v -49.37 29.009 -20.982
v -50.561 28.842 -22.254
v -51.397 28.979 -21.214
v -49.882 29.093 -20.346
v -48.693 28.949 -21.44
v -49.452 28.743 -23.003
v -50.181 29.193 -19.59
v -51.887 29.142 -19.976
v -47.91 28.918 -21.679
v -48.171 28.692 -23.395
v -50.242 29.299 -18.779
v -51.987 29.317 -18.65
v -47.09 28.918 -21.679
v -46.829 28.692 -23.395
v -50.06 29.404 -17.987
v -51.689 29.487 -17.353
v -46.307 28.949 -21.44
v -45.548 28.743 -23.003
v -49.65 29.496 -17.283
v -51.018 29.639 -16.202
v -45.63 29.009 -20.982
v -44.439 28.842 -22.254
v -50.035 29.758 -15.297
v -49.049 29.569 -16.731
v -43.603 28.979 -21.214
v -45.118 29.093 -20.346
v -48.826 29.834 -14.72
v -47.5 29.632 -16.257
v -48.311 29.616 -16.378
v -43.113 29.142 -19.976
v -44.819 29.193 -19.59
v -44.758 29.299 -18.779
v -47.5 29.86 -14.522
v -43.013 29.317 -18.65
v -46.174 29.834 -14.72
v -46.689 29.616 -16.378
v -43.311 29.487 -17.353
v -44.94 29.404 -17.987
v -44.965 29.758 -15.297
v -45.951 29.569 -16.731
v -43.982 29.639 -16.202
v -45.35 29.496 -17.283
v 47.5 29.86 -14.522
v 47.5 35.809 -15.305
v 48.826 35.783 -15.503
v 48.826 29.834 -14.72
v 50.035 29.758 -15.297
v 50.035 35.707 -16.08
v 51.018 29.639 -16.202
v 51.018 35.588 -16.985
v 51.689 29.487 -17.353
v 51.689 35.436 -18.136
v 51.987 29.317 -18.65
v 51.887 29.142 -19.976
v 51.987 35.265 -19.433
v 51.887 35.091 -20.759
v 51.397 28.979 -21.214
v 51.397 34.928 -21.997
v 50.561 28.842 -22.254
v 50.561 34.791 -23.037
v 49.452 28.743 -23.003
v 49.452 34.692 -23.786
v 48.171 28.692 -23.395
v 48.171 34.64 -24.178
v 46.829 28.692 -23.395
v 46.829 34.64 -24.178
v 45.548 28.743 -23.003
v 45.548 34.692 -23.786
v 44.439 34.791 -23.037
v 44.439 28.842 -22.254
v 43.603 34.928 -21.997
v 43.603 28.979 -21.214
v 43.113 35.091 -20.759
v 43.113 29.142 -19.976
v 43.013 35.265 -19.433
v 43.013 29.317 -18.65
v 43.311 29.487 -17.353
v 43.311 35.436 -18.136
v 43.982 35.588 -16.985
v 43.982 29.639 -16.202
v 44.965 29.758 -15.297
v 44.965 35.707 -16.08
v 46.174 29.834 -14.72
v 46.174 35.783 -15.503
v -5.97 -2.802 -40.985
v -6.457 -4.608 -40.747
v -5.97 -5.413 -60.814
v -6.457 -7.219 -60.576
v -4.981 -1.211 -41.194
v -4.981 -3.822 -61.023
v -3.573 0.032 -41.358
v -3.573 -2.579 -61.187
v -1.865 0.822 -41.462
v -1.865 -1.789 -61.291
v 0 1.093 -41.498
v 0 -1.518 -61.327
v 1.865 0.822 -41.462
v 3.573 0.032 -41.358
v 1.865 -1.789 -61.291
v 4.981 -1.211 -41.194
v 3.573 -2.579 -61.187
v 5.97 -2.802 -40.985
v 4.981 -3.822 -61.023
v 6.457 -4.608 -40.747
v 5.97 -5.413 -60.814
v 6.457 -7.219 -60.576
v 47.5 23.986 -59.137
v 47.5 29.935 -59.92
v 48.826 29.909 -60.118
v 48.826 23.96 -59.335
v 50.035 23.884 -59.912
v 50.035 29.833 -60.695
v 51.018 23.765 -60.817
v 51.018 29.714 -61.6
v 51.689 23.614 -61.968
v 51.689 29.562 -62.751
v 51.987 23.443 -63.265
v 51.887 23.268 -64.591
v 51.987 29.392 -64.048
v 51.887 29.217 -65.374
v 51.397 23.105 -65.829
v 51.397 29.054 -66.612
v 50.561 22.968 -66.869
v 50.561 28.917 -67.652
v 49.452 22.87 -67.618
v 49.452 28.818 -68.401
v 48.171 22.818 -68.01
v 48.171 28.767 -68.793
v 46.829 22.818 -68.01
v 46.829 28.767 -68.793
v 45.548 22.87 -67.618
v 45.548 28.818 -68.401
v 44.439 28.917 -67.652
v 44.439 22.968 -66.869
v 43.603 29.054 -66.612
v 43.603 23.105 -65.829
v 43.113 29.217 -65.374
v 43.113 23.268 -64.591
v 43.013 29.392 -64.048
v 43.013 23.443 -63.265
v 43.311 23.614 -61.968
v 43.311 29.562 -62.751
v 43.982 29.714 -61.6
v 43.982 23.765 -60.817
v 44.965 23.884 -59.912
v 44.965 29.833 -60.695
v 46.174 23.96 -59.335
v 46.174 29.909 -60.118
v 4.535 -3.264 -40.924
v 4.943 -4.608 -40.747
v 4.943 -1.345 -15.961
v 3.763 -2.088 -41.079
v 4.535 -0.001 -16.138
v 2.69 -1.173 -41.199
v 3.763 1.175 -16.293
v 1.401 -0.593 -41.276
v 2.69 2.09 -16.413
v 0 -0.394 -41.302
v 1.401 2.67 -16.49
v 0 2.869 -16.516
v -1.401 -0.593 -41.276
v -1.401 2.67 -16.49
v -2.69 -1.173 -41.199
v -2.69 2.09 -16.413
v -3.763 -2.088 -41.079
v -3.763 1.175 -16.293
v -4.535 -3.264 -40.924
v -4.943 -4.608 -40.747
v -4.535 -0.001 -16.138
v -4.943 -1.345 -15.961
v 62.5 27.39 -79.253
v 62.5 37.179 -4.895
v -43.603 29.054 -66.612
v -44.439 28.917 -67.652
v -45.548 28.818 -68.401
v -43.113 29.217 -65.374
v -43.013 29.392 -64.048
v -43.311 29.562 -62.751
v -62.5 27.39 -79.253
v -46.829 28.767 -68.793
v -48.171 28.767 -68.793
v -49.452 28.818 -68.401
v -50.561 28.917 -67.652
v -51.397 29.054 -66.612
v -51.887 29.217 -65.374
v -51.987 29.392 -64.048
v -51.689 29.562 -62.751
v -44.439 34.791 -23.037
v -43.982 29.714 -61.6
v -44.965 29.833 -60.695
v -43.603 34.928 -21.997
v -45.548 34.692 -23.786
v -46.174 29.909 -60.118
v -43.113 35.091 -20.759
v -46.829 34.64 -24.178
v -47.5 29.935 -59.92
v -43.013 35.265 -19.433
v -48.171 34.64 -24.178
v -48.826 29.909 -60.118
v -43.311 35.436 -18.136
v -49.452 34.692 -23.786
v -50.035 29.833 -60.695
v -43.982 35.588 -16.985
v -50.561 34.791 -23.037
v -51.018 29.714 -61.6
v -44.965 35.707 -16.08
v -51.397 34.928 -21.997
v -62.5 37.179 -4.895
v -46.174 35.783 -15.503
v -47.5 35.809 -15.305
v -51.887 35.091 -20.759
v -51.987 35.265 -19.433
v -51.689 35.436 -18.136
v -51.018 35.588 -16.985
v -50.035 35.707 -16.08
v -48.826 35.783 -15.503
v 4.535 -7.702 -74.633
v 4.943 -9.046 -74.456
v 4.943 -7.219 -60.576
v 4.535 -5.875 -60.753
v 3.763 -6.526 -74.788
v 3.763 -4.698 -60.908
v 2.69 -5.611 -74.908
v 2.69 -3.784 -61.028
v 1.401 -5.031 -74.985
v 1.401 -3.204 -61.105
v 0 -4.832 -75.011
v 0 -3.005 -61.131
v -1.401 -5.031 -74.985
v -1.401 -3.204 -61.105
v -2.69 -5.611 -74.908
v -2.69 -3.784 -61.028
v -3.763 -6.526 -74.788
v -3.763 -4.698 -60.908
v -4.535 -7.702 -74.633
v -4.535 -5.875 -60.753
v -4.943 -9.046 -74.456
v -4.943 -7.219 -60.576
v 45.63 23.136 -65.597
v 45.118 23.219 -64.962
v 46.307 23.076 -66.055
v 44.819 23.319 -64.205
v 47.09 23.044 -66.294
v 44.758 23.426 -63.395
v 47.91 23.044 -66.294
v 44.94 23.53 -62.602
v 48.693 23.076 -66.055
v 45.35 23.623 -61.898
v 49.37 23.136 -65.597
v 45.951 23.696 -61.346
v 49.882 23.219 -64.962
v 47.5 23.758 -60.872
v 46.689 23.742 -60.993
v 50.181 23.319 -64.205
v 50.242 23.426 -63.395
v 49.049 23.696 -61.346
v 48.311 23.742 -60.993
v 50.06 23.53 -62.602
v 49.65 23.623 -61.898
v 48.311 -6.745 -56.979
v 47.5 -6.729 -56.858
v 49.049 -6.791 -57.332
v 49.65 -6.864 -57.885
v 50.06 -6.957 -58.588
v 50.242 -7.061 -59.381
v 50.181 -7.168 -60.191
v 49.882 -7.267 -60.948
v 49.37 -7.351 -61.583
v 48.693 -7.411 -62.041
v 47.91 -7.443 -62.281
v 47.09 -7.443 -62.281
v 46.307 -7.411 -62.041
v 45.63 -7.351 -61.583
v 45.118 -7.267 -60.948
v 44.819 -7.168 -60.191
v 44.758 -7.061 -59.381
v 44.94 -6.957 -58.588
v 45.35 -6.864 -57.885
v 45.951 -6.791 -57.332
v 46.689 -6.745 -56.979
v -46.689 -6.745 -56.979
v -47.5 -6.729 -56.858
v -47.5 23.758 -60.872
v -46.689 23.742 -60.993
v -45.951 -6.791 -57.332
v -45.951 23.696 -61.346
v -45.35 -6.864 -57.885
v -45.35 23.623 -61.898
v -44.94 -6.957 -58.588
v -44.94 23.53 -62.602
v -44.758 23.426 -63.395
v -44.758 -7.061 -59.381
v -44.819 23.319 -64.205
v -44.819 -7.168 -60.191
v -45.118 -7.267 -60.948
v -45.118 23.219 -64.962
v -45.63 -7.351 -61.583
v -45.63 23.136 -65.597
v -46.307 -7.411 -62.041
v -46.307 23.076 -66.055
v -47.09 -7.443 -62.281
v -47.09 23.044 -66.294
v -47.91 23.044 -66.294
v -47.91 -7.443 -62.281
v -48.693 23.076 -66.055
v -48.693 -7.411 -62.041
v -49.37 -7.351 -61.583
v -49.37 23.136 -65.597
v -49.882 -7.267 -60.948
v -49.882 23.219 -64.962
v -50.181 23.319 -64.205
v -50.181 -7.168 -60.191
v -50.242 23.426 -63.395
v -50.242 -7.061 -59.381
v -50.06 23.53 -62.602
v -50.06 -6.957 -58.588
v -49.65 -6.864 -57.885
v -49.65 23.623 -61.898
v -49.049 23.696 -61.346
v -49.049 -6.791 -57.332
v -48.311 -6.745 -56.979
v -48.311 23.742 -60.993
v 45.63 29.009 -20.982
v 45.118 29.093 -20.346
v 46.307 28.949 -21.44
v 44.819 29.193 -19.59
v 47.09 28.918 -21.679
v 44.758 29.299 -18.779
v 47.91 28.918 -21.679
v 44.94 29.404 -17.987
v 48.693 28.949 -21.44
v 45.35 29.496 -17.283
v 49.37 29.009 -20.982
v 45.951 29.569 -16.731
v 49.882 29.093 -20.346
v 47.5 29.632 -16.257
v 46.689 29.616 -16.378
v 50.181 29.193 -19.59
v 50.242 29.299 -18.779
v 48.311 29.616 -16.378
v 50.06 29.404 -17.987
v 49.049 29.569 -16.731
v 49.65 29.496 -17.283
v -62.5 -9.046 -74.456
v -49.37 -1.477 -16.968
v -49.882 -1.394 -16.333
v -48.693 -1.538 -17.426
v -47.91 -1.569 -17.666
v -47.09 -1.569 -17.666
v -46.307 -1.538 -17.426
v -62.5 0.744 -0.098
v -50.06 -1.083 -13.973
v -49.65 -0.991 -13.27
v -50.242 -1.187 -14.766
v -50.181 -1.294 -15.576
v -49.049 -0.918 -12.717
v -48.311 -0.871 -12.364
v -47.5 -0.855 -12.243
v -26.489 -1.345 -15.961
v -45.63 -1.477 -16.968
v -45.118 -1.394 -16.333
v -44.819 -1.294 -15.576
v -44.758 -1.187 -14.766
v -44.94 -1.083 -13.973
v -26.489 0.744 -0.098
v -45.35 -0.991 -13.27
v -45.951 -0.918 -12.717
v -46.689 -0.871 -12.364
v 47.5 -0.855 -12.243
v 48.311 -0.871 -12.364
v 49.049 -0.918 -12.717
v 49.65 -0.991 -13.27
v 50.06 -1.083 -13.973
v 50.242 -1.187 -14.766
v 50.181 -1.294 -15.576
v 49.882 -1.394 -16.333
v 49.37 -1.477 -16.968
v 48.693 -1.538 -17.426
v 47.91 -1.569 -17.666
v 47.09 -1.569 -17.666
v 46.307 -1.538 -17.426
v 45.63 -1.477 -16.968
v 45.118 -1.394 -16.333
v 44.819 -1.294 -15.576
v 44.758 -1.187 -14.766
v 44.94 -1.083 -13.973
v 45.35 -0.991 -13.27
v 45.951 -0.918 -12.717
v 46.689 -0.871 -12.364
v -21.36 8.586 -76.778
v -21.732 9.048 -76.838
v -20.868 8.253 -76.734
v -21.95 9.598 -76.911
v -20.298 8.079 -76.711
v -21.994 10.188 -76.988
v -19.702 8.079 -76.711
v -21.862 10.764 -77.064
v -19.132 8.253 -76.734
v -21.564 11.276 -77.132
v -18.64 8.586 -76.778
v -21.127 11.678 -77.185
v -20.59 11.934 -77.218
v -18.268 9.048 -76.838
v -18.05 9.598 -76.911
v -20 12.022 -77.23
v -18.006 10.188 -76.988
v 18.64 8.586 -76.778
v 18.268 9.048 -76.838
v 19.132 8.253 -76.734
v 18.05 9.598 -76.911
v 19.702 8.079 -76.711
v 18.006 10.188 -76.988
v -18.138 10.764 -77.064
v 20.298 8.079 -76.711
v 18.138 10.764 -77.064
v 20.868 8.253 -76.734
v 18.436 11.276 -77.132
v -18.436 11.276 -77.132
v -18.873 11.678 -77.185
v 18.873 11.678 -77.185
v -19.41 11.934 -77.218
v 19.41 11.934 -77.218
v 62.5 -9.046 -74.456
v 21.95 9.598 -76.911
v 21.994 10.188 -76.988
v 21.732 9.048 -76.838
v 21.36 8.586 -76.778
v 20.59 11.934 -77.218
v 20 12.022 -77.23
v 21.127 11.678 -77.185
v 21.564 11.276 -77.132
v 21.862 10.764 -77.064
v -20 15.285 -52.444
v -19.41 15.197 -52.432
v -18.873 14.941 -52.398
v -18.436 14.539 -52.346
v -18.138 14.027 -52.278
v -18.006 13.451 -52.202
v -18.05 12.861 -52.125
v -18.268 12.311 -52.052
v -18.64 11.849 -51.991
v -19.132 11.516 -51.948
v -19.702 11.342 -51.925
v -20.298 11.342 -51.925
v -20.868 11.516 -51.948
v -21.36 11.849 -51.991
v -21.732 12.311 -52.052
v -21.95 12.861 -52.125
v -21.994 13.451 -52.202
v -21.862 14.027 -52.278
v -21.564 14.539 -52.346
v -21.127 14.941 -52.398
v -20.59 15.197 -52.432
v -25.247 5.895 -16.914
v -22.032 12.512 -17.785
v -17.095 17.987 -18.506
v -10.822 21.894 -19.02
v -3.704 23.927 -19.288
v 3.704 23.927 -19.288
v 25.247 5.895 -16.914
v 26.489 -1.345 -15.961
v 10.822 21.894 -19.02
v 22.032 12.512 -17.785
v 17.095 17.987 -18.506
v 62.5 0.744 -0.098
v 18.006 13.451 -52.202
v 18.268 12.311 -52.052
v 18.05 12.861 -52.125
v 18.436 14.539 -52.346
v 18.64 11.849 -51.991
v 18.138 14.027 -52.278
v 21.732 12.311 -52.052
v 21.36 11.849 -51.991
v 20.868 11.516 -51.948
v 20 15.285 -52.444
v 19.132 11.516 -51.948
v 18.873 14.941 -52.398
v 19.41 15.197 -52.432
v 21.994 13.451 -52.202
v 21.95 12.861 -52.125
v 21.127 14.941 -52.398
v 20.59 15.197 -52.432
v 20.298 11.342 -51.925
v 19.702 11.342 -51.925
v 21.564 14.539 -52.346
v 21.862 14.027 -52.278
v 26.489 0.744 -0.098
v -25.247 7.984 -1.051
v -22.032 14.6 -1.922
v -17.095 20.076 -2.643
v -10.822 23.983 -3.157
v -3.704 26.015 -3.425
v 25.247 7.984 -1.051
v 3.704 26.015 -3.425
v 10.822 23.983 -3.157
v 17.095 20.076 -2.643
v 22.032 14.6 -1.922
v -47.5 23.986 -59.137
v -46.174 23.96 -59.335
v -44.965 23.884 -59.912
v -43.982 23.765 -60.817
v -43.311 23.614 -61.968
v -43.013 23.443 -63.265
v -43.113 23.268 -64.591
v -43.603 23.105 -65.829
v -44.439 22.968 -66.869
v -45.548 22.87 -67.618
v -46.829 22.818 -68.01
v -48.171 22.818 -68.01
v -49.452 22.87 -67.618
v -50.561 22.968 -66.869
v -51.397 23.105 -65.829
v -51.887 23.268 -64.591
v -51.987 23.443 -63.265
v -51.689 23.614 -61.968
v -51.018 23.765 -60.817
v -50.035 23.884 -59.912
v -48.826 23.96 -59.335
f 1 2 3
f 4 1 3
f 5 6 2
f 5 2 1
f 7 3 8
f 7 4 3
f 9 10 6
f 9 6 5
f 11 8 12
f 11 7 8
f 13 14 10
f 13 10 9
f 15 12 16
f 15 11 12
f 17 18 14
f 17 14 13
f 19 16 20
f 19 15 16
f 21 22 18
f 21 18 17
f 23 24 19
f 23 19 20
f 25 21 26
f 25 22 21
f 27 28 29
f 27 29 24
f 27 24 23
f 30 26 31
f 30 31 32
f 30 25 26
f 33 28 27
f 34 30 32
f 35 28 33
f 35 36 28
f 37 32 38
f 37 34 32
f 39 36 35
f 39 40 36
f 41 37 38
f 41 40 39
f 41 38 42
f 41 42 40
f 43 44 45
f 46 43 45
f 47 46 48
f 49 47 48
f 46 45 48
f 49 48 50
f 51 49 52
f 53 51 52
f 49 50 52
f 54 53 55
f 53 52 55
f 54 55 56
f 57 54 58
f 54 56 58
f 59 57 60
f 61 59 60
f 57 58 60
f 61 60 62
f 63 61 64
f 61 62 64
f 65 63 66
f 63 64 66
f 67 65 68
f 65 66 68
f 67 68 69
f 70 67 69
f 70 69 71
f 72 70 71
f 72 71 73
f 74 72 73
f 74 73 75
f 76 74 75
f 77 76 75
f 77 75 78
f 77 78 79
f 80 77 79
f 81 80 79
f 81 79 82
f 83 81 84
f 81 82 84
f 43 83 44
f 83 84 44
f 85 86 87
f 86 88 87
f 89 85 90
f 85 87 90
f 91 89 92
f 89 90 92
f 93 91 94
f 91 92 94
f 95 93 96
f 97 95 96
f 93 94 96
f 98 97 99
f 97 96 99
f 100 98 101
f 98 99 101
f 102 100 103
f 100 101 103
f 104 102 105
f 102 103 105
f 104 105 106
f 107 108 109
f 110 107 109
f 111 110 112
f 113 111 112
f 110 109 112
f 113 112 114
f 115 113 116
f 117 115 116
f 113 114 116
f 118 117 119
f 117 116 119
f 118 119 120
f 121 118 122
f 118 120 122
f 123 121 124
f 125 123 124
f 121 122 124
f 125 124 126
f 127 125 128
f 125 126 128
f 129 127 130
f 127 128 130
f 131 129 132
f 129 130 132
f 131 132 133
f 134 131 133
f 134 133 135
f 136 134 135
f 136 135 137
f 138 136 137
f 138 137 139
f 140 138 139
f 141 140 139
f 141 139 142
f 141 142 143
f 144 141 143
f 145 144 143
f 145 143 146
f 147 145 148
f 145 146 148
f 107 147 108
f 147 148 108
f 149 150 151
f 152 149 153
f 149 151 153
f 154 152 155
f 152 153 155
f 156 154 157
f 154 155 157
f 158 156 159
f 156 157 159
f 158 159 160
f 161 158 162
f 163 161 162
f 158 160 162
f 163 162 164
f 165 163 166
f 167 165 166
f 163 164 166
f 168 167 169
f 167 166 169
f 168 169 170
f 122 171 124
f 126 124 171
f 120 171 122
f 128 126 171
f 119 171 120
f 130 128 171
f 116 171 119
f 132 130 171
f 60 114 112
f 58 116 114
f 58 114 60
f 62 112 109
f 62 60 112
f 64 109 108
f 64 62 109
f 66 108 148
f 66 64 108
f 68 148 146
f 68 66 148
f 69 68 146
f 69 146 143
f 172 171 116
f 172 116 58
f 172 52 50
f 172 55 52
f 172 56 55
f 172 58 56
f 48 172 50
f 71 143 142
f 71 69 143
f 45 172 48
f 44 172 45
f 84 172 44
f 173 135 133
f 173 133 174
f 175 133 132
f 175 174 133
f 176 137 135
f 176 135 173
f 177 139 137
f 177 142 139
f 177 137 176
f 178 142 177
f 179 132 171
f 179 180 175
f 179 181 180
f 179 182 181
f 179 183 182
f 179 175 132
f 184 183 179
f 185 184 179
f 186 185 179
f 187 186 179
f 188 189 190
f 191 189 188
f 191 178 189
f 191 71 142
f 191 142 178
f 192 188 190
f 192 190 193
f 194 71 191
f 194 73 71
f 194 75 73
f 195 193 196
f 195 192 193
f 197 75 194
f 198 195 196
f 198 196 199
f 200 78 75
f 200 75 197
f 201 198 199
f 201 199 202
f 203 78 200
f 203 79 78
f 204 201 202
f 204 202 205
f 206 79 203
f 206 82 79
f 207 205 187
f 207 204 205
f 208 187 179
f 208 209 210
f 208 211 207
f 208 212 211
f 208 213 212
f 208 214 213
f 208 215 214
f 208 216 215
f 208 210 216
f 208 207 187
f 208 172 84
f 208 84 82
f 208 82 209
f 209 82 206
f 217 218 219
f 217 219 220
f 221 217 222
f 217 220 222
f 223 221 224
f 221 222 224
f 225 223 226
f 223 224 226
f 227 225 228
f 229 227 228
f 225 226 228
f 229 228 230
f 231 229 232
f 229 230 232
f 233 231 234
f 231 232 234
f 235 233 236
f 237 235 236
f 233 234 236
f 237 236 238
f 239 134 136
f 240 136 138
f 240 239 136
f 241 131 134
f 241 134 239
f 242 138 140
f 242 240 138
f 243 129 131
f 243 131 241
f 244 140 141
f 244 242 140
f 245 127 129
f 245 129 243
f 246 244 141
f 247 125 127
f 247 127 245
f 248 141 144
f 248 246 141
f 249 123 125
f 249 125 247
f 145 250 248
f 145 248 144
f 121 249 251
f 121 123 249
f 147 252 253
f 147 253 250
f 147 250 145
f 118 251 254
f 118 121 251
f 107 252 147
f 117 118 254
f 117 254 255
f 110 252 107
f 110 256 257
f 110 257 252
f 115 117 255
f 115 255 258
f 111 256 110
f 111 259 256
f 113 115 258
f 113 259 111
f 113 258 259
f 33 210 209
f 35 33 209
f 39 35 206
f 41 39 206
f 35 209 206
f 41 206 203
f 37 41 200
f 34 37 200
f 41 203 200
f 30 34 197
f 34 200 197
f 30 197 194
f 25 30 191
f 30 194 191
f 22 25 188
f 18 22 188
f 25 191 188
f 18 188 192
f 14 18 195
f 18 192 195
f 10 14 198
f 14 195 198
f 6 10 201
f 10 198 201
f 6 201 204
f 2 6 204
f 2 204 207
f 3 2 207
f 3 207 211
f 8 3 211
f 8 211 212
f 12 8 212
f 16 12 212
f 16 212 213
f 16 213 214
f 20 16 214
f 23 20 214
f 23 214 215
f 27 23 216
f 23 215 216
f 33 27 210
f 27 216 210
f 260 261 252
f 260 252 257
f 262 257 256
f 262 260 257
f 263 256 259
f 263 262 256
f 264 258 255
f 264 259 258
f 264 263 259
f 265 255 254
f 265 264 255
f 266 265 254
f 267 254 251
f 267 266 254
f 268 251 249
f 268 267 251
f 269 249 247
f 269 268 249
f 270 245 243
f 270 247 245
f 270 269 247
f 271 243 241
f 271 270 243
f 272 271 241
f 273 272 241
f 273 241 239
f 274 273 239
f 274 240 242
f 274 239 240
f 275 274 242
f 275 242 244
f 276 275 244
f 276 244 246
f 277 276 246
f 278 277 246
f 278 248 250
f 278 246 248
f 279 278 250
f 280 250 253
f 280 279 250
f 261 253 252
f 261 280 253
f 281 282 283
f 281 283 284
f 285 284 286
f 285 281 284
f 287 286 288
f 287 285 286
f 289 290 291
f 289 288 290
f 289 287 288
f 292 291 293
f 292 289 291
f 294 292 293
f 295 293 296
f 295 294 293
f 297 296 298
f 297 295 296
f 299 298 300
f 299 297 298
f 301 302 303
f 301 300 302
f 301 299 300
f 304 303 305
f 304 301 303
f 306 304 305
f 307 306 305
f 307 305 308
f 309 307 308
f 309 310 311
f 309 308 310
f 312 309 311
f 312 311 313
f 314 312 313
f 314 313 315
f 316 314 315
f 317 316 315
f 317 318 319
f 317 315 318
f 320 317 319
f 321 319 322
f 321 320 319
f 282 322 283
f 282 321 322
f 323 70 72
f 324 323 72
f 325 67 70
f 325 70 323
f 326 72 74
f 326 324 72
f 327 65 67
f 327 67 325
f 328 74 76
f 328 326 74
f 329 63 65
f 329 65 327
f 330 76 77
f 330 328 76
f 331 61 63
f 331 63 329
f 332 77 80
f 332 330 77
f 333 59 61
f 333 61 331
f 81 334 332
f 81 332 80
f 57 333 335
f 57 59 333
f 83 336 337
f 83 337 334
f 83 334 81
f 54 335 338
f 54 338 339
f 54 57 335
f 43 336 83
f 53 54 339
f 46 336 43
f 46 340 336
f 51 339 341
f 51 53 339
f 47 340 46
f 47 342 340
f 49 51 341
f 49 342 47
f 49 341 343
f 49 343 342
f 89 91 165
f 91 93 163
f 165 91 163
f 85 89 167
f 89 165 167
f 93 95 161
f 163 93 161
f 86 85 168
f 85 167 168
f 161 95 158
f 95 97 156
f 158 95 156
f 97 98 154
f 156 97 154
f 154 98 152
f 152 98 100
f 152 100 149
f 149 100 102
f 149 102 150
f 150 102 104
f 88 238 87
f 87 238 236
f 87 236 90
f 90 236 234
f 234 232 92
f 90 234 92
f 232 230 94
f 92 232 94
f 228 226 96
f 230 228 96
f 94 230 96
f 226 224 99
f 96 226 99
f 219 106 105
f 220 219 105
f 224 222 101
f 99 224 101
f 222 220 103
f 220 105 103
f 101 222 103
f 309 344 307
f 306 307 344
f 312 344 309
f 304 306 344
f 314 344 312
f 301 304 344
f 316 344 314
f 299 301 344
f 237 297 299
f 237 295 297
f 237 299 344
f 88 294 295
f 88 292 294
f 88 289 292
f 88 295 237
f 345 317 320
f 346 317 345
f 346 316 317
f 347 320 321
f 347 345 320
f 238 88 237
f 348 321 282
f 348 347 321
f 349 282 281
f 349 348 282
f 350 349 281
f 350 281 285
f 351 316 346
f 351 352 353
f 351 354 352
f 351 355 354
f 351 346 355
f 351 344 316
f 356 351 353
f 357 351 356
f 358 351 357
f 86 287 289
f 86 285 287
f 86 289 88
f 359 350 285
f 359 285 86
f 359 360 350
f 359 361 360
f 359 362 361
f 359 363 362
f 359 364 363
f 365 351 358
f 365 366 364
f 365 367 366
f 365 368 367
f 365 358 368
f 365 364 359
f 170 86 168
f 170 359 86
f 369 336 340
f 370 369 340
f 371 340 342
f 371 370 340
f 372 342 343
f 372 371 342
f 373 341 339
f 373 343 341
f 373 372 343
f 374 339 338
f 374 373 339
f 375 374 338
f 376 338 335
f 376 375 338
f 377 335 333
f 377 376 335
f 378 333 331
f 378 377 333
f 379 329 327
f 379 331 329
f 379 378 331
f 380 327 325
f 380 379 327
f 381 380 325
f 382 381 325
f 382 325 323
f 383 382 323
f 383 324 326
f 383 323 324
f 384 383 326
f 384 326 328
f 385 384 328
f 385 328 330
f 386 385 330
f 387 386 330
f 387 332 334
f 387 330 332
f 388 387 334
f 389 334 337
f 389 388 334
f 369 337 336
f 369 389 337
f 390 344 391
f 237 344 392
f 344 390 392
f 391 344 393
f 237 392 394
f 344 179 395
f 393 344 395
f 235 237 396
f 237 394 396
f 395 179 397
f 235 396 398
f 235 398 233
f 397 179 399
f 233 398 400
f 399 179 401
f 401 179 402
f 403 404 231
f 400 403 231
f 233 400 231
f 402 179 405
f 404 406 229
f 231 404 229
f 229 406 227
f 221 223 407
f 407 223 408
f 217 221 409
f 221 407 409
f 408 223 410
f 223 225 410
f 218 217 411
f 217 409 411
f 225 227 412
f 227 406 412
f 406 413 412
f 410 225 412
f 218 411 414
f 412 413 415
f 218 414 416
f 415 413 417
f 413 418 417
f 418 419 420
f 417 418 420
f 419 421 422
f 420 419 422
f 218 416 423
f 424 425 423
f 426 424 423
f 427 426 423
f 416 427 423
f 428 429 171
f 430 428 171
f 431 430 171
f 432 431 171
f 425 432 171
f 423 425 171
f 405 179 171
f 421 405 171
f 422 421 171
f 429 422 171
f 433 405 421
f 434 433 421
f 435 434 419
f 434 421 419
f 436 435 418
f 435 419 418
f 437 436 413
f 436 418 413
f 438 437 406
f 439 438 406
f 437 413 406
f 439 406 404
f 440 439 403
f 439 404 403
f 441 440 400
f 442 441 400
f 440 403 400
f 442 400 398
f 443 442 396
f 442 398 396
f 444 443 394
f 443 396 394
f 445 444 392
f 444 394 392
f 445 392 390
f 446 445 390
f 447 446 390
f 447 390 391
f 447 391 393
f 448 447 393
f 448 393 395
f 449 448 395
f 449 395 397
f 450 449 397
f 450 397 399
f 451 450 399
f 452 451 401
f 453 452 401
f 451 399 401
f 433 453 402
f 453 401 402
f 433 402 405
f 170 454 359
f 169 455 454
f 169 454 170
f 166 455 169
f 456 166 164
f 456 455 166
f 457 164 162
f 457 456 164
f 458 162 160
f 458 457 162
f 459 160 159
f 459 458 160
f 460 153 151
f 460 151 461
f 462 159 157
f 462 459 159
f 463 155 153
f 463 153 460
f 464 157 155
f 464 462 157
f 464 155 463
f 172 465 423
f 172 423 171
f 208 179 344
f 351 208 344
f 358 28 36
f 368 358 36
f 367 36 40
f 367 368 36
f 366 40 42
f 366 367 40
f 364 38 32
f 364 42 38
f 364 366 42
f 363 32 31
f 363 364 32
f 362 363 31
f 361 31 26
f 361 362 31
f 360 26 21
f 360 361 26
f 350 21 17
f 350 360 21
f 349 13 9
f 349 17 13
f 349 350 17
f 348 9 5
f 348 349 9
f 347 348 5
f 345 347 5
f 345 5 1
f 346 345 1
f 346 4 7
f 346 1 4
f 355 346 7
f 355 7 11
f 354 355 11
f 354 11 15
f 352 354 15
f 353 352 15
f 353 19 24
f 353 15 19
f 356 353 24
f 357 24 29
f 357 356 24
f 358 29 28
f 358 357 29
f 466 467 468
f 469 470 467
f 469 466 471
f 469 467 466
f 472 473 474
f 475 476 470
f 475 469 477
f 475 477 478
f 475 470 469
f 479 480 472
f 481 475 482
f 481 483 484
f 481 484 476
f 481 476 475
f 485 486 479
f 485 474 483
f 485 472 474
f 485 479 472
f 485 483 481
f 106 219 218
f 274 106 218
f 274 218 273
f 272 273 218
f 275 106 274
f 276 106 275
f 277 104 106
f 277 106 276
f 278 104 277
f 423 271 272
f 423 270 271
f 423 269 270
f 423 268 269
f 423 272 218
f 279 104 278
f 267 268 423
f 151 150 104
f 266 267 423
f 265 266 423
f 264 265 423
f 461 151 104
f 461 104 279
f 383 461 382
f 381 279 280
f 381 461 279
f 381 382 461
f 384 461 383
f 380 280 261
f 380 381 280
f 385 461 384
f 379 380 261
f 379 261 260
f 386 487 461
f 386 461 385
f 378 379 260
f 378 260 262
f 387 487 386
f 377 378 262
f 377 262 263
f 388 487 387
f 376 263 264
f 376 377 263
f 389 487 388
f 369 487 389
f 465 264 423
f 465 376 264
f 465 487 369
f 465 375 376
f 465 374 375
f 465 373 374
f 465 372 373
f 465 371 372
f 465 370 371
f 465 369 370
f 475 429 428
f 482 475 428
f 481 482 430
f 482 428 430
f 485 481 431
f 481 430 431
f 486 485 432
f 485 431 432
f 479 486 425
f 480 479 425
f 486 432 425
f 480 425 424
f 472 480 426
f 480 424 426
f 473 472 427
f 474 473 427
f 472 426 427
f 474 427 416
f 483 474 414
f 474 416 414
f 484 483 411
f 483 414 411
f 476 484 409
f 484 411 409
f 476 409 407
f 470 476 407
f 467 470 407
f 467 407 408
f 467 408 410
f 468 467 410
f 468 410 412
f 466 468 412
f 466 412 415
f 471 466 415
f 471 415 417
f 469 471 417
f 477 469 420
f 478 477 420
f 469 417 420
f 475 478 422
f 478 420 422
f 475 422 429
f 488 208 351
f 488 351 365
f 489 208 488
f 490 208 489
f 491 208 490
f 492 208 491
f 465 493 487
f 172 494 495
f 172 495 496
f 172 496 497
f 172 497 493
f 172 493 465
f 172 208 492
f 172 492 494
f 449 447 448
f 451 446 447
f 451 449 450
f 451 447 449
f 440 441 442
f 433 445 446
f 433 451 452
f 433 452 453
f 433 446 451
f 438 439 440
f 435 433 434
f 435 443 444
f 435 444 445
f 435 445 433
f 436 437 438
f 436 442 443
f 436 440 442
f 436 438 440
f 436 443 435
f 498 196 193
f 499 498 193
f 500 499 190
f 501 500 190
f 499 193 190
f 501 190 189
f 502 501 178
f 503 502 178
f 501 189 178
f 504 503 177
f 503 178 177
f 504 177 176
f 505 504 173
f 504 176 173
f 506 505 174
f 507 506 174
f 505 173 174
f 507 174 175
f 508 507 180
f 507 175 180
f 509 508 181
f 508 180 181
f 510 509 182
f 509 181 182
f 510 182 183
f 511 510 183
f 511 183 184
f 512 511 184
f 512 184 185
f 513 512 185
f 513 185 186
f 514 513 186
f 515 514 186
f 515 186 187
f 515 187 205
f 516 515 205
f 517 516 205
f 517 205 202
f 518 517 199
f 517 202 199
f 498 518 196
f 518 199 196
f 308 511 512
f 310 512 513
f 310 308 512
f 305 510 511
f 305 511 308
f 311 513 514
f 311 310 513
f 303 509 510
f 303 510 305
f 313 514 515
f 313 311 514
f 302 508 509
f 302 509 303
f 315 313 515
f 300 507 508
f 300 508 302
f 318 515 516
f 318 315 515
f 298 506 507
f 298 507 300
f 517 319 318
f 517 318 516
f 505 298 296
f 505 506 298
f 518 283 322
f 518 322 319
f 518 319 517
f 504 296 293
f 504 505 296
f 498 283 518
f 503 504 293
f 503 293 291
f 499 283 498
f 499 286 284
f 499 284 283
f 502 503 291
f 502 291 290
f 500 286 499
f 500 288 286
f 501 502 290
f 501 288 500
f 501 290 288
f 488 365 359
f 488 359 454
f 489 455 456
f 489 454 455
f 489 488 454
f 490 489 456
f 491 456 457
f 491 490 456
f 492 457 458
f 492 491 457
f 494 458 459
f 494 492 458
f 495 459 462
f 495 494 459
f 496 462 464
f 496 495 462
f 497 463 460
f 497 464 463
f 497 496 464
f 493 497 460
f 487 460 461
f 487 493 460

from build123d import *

# Parameters (mm, degrees)
EXTRUDE_TOP_BLOCK_DEPTH             = 75
CUT_EXTRUDE_BOLT_PATTERN_DEPTH      = 108.574034239
CUT_EXTRUDE_BOLT_PATTERN_DEPTH_BACK = 108.574034239
SKETCH2_R                           = 2.75
EXTRUDE_START                       = -16
EXTRUDE_ADDITION_MATERIAL_DEPTH     = 59
CUT_EXTRUDE_SHAFT_PATHWAY_REACH     = 99.296
SKETCH7_R                           = 2
CUT_EXTRUDE1_DEPTH                  = 25
SKETCH8_R                           = 4.5
CUT_EXTRUDE2_DEPTH                  = 6


with BuildPart() as part:
    # Sketch1 → Extrude Top Block (new body)
    with BuildSketch(Plane(origin=(0, 0, 0), x_dir=(1, 0, 0), z_dir=(0, 0.13052619222003847, 0.9914448613738122))):
        with BuildLine():
            Line((62.5, 0.75), (62.5, 37.5))
            Line((62.5, 37.5), (-62.5, 37.5))
            Line((-62.5, 37.5), (-62.5, 0.75))
            Line((-62.5, 0.75), (-26.489384666, 0.75))
            ThreePointArc((-26.489384666, 0.75), (0, 26.5), (26.489384666, 0.75))
            Line((26.489384666, 0.75), (62.5, 0.75))
        make_face()
    extrude(amount=-EXTRUDE_TOP_BLOCK_DEPTH)

    # Sketch2 → Cut-Extrude Bolt Pattern (cut, two sides: drawn at the far end of the back side and taken through both)
    with BuildSketch(Plane(origin=(0, 37.179182302, -4.894732208), x_dir=(1, 0, 0), z_dir=(0, 0.9914448613738122, -0.13052619222003847)).offset(-CUT_EXTRUDE_BOLT_PATTERN_DEPTH_BACK)):
        with Locations(Location((-47.5, 15, 0), (0, 0, 270))):
            Circle(SKETCH2_R)
        with Locations(Location((-47.5, 60, 0), (0, 0, 270))):
            Circle(SKETCH2_R)
        with Locations(Location((47.5, 15, 0), (0, 0, 270))):
            Circle(SKETCH2_R)
        with Locations(Location((47.5, 60, 0), (0, 0, 270))):
            Circle(SKETCH2_R)
    extrude(amount=CUT_EXTRUDE_BOLT_PATTERN_DEPTH + CUT_EXTRUDE_BOLT_PATTERN_DEPTH_BACK, mode=Mode.SUBTRACT)

    # Sketch4 → Extrude Addition Material (add)
    with BuildSketch(Plane(origin=(0, 0, 0), x_dir=(1, 0, 0), z_dir=(0, 0.13052619222003847, 0.9914448613738122)).offset(EXTRUDE_START)):
        with BuildLine():
            Line((-26.489384666, 0.75), (26.489384666, 0.75))
            ThreePointArc((26.489384666, 0.75), (0, 26.5), (-26.489384666, 0.75))
        make_face()
    extrude(amount=-EXTRUDE_ADDITION_MATERIAL_DEPTH)

    # Sketch3 → Cut-Extrude Seat for Linear Bearing (revolve, cut)
    with BuildSketch(Plane(origin=(0, 0, 0), x_dir=(0, 0, -1), z_dir=(1, 0, 0))):
        Polygon((41.497659566, 1.092817718), (61.326556793, -1.517706126), (60.478136544, -7.962097725), (40.649239316, -5.351573881), align=None)
    revolve(axis=Axis((0, 0, 0), (0, -0.1305261922200383, -0.9914448613738122)), mode=Mode.SUBTRACT)

    # Cut-Extrude Shaft Pathway: up to this face of the body (flat: up to its plane)
    cut_extrude_shaft_pathway_end = Plane(part.part.faces().sort_by_distance((0, 9.171918557, -76.854678029))[0])
    # Sketch6 → Cut-Extrude Shaft Pathway (cut, up to the picked face)
    with BuildSketch(Plane(origin=(0, -2.088419076, -15.863117782), x_dir=(1, 0, 0), z_dir=(0, 0.13052619222003847, 0.9914448613738122)), mode=Mode.PRIVATE) as cut_extrude_shaft_pathway_sk1:
        with BuildLine():
            Line((-4.943429983, 0.75), (4.943429983, 0.75))
            ThreePointArc((4.943429983, 0.75), (0, 5), (-4.943429983, 0.75))
        make_face()
    cut_extrude_shaft_pathway_tool1 = split(extrude(cut_extrude_shaft_pathway_sk1.sketch, amount=-CUT_EXTRUDE_SHAFT_PATHWAY_REACH, mode=Mode.PRIVATE), bisect_by=cut_extrude_shaft_pathway_end, keep=Keep.BOTH, mode=Mode.PRIVATE)
    add(cut_extrude_shaft_pathway_tool1.solids().sort_by(Axis((0, 0.422663, -16.193708), (0, -0.13052619222003847, -0.9914448613738122)))[0], mode=Mode.SUBTRACT)

    # Sketch7 → Cut-Extrude1 (cut)
    with BuildSketch(Plane(origin=(0, -9.789464417, -74.358364603), x_dir=(-1, 0, 0), z_dir=(0, -0.13052619222003847, -0.9914448613738122))):
        with Locations(Location((-20, 20, 0), (0, 0, 90))):
            Circle(SKETCH7_R)
        with Locations(Location((20, 20, 0), (0, 0, 90))):
            Circle(SKETCH7_R)
    extrude(amount=-CUT_EXTRUDE1_DEPTH, mode=Mode.SUBTRACT)

    # Sketch8 → Cut-Extrude2 (cut)
    with BuildSketch(Plane(origin=(0, 37.179182302, -4.894732208), x_dir=(1, 0, 0), z_dir=(0, 0.9914448613738122, -0.13052619222003847))):
        with Locations(Location((47.5, 15, 0), (0, 0, 270))):
            Circle(SKETCH8_R)
        with Locations(Location((47.5, 60, 0), (0, 0, 270))):
            Circle(SKETCH8_R)
        with Locations(Location((-47.5, 15, 0), (0, 0, 270))):
            Circle(SKETCH8_R)
        with Locations(Location((-47.5, 60, 0), (0, 0, 270))):
            Circle(SKETCH8_R)
    extrude(amount=-CUT_EXTRUDE2_DEPTH, mode=Mode.SUBTRACT)


solid = part.part
